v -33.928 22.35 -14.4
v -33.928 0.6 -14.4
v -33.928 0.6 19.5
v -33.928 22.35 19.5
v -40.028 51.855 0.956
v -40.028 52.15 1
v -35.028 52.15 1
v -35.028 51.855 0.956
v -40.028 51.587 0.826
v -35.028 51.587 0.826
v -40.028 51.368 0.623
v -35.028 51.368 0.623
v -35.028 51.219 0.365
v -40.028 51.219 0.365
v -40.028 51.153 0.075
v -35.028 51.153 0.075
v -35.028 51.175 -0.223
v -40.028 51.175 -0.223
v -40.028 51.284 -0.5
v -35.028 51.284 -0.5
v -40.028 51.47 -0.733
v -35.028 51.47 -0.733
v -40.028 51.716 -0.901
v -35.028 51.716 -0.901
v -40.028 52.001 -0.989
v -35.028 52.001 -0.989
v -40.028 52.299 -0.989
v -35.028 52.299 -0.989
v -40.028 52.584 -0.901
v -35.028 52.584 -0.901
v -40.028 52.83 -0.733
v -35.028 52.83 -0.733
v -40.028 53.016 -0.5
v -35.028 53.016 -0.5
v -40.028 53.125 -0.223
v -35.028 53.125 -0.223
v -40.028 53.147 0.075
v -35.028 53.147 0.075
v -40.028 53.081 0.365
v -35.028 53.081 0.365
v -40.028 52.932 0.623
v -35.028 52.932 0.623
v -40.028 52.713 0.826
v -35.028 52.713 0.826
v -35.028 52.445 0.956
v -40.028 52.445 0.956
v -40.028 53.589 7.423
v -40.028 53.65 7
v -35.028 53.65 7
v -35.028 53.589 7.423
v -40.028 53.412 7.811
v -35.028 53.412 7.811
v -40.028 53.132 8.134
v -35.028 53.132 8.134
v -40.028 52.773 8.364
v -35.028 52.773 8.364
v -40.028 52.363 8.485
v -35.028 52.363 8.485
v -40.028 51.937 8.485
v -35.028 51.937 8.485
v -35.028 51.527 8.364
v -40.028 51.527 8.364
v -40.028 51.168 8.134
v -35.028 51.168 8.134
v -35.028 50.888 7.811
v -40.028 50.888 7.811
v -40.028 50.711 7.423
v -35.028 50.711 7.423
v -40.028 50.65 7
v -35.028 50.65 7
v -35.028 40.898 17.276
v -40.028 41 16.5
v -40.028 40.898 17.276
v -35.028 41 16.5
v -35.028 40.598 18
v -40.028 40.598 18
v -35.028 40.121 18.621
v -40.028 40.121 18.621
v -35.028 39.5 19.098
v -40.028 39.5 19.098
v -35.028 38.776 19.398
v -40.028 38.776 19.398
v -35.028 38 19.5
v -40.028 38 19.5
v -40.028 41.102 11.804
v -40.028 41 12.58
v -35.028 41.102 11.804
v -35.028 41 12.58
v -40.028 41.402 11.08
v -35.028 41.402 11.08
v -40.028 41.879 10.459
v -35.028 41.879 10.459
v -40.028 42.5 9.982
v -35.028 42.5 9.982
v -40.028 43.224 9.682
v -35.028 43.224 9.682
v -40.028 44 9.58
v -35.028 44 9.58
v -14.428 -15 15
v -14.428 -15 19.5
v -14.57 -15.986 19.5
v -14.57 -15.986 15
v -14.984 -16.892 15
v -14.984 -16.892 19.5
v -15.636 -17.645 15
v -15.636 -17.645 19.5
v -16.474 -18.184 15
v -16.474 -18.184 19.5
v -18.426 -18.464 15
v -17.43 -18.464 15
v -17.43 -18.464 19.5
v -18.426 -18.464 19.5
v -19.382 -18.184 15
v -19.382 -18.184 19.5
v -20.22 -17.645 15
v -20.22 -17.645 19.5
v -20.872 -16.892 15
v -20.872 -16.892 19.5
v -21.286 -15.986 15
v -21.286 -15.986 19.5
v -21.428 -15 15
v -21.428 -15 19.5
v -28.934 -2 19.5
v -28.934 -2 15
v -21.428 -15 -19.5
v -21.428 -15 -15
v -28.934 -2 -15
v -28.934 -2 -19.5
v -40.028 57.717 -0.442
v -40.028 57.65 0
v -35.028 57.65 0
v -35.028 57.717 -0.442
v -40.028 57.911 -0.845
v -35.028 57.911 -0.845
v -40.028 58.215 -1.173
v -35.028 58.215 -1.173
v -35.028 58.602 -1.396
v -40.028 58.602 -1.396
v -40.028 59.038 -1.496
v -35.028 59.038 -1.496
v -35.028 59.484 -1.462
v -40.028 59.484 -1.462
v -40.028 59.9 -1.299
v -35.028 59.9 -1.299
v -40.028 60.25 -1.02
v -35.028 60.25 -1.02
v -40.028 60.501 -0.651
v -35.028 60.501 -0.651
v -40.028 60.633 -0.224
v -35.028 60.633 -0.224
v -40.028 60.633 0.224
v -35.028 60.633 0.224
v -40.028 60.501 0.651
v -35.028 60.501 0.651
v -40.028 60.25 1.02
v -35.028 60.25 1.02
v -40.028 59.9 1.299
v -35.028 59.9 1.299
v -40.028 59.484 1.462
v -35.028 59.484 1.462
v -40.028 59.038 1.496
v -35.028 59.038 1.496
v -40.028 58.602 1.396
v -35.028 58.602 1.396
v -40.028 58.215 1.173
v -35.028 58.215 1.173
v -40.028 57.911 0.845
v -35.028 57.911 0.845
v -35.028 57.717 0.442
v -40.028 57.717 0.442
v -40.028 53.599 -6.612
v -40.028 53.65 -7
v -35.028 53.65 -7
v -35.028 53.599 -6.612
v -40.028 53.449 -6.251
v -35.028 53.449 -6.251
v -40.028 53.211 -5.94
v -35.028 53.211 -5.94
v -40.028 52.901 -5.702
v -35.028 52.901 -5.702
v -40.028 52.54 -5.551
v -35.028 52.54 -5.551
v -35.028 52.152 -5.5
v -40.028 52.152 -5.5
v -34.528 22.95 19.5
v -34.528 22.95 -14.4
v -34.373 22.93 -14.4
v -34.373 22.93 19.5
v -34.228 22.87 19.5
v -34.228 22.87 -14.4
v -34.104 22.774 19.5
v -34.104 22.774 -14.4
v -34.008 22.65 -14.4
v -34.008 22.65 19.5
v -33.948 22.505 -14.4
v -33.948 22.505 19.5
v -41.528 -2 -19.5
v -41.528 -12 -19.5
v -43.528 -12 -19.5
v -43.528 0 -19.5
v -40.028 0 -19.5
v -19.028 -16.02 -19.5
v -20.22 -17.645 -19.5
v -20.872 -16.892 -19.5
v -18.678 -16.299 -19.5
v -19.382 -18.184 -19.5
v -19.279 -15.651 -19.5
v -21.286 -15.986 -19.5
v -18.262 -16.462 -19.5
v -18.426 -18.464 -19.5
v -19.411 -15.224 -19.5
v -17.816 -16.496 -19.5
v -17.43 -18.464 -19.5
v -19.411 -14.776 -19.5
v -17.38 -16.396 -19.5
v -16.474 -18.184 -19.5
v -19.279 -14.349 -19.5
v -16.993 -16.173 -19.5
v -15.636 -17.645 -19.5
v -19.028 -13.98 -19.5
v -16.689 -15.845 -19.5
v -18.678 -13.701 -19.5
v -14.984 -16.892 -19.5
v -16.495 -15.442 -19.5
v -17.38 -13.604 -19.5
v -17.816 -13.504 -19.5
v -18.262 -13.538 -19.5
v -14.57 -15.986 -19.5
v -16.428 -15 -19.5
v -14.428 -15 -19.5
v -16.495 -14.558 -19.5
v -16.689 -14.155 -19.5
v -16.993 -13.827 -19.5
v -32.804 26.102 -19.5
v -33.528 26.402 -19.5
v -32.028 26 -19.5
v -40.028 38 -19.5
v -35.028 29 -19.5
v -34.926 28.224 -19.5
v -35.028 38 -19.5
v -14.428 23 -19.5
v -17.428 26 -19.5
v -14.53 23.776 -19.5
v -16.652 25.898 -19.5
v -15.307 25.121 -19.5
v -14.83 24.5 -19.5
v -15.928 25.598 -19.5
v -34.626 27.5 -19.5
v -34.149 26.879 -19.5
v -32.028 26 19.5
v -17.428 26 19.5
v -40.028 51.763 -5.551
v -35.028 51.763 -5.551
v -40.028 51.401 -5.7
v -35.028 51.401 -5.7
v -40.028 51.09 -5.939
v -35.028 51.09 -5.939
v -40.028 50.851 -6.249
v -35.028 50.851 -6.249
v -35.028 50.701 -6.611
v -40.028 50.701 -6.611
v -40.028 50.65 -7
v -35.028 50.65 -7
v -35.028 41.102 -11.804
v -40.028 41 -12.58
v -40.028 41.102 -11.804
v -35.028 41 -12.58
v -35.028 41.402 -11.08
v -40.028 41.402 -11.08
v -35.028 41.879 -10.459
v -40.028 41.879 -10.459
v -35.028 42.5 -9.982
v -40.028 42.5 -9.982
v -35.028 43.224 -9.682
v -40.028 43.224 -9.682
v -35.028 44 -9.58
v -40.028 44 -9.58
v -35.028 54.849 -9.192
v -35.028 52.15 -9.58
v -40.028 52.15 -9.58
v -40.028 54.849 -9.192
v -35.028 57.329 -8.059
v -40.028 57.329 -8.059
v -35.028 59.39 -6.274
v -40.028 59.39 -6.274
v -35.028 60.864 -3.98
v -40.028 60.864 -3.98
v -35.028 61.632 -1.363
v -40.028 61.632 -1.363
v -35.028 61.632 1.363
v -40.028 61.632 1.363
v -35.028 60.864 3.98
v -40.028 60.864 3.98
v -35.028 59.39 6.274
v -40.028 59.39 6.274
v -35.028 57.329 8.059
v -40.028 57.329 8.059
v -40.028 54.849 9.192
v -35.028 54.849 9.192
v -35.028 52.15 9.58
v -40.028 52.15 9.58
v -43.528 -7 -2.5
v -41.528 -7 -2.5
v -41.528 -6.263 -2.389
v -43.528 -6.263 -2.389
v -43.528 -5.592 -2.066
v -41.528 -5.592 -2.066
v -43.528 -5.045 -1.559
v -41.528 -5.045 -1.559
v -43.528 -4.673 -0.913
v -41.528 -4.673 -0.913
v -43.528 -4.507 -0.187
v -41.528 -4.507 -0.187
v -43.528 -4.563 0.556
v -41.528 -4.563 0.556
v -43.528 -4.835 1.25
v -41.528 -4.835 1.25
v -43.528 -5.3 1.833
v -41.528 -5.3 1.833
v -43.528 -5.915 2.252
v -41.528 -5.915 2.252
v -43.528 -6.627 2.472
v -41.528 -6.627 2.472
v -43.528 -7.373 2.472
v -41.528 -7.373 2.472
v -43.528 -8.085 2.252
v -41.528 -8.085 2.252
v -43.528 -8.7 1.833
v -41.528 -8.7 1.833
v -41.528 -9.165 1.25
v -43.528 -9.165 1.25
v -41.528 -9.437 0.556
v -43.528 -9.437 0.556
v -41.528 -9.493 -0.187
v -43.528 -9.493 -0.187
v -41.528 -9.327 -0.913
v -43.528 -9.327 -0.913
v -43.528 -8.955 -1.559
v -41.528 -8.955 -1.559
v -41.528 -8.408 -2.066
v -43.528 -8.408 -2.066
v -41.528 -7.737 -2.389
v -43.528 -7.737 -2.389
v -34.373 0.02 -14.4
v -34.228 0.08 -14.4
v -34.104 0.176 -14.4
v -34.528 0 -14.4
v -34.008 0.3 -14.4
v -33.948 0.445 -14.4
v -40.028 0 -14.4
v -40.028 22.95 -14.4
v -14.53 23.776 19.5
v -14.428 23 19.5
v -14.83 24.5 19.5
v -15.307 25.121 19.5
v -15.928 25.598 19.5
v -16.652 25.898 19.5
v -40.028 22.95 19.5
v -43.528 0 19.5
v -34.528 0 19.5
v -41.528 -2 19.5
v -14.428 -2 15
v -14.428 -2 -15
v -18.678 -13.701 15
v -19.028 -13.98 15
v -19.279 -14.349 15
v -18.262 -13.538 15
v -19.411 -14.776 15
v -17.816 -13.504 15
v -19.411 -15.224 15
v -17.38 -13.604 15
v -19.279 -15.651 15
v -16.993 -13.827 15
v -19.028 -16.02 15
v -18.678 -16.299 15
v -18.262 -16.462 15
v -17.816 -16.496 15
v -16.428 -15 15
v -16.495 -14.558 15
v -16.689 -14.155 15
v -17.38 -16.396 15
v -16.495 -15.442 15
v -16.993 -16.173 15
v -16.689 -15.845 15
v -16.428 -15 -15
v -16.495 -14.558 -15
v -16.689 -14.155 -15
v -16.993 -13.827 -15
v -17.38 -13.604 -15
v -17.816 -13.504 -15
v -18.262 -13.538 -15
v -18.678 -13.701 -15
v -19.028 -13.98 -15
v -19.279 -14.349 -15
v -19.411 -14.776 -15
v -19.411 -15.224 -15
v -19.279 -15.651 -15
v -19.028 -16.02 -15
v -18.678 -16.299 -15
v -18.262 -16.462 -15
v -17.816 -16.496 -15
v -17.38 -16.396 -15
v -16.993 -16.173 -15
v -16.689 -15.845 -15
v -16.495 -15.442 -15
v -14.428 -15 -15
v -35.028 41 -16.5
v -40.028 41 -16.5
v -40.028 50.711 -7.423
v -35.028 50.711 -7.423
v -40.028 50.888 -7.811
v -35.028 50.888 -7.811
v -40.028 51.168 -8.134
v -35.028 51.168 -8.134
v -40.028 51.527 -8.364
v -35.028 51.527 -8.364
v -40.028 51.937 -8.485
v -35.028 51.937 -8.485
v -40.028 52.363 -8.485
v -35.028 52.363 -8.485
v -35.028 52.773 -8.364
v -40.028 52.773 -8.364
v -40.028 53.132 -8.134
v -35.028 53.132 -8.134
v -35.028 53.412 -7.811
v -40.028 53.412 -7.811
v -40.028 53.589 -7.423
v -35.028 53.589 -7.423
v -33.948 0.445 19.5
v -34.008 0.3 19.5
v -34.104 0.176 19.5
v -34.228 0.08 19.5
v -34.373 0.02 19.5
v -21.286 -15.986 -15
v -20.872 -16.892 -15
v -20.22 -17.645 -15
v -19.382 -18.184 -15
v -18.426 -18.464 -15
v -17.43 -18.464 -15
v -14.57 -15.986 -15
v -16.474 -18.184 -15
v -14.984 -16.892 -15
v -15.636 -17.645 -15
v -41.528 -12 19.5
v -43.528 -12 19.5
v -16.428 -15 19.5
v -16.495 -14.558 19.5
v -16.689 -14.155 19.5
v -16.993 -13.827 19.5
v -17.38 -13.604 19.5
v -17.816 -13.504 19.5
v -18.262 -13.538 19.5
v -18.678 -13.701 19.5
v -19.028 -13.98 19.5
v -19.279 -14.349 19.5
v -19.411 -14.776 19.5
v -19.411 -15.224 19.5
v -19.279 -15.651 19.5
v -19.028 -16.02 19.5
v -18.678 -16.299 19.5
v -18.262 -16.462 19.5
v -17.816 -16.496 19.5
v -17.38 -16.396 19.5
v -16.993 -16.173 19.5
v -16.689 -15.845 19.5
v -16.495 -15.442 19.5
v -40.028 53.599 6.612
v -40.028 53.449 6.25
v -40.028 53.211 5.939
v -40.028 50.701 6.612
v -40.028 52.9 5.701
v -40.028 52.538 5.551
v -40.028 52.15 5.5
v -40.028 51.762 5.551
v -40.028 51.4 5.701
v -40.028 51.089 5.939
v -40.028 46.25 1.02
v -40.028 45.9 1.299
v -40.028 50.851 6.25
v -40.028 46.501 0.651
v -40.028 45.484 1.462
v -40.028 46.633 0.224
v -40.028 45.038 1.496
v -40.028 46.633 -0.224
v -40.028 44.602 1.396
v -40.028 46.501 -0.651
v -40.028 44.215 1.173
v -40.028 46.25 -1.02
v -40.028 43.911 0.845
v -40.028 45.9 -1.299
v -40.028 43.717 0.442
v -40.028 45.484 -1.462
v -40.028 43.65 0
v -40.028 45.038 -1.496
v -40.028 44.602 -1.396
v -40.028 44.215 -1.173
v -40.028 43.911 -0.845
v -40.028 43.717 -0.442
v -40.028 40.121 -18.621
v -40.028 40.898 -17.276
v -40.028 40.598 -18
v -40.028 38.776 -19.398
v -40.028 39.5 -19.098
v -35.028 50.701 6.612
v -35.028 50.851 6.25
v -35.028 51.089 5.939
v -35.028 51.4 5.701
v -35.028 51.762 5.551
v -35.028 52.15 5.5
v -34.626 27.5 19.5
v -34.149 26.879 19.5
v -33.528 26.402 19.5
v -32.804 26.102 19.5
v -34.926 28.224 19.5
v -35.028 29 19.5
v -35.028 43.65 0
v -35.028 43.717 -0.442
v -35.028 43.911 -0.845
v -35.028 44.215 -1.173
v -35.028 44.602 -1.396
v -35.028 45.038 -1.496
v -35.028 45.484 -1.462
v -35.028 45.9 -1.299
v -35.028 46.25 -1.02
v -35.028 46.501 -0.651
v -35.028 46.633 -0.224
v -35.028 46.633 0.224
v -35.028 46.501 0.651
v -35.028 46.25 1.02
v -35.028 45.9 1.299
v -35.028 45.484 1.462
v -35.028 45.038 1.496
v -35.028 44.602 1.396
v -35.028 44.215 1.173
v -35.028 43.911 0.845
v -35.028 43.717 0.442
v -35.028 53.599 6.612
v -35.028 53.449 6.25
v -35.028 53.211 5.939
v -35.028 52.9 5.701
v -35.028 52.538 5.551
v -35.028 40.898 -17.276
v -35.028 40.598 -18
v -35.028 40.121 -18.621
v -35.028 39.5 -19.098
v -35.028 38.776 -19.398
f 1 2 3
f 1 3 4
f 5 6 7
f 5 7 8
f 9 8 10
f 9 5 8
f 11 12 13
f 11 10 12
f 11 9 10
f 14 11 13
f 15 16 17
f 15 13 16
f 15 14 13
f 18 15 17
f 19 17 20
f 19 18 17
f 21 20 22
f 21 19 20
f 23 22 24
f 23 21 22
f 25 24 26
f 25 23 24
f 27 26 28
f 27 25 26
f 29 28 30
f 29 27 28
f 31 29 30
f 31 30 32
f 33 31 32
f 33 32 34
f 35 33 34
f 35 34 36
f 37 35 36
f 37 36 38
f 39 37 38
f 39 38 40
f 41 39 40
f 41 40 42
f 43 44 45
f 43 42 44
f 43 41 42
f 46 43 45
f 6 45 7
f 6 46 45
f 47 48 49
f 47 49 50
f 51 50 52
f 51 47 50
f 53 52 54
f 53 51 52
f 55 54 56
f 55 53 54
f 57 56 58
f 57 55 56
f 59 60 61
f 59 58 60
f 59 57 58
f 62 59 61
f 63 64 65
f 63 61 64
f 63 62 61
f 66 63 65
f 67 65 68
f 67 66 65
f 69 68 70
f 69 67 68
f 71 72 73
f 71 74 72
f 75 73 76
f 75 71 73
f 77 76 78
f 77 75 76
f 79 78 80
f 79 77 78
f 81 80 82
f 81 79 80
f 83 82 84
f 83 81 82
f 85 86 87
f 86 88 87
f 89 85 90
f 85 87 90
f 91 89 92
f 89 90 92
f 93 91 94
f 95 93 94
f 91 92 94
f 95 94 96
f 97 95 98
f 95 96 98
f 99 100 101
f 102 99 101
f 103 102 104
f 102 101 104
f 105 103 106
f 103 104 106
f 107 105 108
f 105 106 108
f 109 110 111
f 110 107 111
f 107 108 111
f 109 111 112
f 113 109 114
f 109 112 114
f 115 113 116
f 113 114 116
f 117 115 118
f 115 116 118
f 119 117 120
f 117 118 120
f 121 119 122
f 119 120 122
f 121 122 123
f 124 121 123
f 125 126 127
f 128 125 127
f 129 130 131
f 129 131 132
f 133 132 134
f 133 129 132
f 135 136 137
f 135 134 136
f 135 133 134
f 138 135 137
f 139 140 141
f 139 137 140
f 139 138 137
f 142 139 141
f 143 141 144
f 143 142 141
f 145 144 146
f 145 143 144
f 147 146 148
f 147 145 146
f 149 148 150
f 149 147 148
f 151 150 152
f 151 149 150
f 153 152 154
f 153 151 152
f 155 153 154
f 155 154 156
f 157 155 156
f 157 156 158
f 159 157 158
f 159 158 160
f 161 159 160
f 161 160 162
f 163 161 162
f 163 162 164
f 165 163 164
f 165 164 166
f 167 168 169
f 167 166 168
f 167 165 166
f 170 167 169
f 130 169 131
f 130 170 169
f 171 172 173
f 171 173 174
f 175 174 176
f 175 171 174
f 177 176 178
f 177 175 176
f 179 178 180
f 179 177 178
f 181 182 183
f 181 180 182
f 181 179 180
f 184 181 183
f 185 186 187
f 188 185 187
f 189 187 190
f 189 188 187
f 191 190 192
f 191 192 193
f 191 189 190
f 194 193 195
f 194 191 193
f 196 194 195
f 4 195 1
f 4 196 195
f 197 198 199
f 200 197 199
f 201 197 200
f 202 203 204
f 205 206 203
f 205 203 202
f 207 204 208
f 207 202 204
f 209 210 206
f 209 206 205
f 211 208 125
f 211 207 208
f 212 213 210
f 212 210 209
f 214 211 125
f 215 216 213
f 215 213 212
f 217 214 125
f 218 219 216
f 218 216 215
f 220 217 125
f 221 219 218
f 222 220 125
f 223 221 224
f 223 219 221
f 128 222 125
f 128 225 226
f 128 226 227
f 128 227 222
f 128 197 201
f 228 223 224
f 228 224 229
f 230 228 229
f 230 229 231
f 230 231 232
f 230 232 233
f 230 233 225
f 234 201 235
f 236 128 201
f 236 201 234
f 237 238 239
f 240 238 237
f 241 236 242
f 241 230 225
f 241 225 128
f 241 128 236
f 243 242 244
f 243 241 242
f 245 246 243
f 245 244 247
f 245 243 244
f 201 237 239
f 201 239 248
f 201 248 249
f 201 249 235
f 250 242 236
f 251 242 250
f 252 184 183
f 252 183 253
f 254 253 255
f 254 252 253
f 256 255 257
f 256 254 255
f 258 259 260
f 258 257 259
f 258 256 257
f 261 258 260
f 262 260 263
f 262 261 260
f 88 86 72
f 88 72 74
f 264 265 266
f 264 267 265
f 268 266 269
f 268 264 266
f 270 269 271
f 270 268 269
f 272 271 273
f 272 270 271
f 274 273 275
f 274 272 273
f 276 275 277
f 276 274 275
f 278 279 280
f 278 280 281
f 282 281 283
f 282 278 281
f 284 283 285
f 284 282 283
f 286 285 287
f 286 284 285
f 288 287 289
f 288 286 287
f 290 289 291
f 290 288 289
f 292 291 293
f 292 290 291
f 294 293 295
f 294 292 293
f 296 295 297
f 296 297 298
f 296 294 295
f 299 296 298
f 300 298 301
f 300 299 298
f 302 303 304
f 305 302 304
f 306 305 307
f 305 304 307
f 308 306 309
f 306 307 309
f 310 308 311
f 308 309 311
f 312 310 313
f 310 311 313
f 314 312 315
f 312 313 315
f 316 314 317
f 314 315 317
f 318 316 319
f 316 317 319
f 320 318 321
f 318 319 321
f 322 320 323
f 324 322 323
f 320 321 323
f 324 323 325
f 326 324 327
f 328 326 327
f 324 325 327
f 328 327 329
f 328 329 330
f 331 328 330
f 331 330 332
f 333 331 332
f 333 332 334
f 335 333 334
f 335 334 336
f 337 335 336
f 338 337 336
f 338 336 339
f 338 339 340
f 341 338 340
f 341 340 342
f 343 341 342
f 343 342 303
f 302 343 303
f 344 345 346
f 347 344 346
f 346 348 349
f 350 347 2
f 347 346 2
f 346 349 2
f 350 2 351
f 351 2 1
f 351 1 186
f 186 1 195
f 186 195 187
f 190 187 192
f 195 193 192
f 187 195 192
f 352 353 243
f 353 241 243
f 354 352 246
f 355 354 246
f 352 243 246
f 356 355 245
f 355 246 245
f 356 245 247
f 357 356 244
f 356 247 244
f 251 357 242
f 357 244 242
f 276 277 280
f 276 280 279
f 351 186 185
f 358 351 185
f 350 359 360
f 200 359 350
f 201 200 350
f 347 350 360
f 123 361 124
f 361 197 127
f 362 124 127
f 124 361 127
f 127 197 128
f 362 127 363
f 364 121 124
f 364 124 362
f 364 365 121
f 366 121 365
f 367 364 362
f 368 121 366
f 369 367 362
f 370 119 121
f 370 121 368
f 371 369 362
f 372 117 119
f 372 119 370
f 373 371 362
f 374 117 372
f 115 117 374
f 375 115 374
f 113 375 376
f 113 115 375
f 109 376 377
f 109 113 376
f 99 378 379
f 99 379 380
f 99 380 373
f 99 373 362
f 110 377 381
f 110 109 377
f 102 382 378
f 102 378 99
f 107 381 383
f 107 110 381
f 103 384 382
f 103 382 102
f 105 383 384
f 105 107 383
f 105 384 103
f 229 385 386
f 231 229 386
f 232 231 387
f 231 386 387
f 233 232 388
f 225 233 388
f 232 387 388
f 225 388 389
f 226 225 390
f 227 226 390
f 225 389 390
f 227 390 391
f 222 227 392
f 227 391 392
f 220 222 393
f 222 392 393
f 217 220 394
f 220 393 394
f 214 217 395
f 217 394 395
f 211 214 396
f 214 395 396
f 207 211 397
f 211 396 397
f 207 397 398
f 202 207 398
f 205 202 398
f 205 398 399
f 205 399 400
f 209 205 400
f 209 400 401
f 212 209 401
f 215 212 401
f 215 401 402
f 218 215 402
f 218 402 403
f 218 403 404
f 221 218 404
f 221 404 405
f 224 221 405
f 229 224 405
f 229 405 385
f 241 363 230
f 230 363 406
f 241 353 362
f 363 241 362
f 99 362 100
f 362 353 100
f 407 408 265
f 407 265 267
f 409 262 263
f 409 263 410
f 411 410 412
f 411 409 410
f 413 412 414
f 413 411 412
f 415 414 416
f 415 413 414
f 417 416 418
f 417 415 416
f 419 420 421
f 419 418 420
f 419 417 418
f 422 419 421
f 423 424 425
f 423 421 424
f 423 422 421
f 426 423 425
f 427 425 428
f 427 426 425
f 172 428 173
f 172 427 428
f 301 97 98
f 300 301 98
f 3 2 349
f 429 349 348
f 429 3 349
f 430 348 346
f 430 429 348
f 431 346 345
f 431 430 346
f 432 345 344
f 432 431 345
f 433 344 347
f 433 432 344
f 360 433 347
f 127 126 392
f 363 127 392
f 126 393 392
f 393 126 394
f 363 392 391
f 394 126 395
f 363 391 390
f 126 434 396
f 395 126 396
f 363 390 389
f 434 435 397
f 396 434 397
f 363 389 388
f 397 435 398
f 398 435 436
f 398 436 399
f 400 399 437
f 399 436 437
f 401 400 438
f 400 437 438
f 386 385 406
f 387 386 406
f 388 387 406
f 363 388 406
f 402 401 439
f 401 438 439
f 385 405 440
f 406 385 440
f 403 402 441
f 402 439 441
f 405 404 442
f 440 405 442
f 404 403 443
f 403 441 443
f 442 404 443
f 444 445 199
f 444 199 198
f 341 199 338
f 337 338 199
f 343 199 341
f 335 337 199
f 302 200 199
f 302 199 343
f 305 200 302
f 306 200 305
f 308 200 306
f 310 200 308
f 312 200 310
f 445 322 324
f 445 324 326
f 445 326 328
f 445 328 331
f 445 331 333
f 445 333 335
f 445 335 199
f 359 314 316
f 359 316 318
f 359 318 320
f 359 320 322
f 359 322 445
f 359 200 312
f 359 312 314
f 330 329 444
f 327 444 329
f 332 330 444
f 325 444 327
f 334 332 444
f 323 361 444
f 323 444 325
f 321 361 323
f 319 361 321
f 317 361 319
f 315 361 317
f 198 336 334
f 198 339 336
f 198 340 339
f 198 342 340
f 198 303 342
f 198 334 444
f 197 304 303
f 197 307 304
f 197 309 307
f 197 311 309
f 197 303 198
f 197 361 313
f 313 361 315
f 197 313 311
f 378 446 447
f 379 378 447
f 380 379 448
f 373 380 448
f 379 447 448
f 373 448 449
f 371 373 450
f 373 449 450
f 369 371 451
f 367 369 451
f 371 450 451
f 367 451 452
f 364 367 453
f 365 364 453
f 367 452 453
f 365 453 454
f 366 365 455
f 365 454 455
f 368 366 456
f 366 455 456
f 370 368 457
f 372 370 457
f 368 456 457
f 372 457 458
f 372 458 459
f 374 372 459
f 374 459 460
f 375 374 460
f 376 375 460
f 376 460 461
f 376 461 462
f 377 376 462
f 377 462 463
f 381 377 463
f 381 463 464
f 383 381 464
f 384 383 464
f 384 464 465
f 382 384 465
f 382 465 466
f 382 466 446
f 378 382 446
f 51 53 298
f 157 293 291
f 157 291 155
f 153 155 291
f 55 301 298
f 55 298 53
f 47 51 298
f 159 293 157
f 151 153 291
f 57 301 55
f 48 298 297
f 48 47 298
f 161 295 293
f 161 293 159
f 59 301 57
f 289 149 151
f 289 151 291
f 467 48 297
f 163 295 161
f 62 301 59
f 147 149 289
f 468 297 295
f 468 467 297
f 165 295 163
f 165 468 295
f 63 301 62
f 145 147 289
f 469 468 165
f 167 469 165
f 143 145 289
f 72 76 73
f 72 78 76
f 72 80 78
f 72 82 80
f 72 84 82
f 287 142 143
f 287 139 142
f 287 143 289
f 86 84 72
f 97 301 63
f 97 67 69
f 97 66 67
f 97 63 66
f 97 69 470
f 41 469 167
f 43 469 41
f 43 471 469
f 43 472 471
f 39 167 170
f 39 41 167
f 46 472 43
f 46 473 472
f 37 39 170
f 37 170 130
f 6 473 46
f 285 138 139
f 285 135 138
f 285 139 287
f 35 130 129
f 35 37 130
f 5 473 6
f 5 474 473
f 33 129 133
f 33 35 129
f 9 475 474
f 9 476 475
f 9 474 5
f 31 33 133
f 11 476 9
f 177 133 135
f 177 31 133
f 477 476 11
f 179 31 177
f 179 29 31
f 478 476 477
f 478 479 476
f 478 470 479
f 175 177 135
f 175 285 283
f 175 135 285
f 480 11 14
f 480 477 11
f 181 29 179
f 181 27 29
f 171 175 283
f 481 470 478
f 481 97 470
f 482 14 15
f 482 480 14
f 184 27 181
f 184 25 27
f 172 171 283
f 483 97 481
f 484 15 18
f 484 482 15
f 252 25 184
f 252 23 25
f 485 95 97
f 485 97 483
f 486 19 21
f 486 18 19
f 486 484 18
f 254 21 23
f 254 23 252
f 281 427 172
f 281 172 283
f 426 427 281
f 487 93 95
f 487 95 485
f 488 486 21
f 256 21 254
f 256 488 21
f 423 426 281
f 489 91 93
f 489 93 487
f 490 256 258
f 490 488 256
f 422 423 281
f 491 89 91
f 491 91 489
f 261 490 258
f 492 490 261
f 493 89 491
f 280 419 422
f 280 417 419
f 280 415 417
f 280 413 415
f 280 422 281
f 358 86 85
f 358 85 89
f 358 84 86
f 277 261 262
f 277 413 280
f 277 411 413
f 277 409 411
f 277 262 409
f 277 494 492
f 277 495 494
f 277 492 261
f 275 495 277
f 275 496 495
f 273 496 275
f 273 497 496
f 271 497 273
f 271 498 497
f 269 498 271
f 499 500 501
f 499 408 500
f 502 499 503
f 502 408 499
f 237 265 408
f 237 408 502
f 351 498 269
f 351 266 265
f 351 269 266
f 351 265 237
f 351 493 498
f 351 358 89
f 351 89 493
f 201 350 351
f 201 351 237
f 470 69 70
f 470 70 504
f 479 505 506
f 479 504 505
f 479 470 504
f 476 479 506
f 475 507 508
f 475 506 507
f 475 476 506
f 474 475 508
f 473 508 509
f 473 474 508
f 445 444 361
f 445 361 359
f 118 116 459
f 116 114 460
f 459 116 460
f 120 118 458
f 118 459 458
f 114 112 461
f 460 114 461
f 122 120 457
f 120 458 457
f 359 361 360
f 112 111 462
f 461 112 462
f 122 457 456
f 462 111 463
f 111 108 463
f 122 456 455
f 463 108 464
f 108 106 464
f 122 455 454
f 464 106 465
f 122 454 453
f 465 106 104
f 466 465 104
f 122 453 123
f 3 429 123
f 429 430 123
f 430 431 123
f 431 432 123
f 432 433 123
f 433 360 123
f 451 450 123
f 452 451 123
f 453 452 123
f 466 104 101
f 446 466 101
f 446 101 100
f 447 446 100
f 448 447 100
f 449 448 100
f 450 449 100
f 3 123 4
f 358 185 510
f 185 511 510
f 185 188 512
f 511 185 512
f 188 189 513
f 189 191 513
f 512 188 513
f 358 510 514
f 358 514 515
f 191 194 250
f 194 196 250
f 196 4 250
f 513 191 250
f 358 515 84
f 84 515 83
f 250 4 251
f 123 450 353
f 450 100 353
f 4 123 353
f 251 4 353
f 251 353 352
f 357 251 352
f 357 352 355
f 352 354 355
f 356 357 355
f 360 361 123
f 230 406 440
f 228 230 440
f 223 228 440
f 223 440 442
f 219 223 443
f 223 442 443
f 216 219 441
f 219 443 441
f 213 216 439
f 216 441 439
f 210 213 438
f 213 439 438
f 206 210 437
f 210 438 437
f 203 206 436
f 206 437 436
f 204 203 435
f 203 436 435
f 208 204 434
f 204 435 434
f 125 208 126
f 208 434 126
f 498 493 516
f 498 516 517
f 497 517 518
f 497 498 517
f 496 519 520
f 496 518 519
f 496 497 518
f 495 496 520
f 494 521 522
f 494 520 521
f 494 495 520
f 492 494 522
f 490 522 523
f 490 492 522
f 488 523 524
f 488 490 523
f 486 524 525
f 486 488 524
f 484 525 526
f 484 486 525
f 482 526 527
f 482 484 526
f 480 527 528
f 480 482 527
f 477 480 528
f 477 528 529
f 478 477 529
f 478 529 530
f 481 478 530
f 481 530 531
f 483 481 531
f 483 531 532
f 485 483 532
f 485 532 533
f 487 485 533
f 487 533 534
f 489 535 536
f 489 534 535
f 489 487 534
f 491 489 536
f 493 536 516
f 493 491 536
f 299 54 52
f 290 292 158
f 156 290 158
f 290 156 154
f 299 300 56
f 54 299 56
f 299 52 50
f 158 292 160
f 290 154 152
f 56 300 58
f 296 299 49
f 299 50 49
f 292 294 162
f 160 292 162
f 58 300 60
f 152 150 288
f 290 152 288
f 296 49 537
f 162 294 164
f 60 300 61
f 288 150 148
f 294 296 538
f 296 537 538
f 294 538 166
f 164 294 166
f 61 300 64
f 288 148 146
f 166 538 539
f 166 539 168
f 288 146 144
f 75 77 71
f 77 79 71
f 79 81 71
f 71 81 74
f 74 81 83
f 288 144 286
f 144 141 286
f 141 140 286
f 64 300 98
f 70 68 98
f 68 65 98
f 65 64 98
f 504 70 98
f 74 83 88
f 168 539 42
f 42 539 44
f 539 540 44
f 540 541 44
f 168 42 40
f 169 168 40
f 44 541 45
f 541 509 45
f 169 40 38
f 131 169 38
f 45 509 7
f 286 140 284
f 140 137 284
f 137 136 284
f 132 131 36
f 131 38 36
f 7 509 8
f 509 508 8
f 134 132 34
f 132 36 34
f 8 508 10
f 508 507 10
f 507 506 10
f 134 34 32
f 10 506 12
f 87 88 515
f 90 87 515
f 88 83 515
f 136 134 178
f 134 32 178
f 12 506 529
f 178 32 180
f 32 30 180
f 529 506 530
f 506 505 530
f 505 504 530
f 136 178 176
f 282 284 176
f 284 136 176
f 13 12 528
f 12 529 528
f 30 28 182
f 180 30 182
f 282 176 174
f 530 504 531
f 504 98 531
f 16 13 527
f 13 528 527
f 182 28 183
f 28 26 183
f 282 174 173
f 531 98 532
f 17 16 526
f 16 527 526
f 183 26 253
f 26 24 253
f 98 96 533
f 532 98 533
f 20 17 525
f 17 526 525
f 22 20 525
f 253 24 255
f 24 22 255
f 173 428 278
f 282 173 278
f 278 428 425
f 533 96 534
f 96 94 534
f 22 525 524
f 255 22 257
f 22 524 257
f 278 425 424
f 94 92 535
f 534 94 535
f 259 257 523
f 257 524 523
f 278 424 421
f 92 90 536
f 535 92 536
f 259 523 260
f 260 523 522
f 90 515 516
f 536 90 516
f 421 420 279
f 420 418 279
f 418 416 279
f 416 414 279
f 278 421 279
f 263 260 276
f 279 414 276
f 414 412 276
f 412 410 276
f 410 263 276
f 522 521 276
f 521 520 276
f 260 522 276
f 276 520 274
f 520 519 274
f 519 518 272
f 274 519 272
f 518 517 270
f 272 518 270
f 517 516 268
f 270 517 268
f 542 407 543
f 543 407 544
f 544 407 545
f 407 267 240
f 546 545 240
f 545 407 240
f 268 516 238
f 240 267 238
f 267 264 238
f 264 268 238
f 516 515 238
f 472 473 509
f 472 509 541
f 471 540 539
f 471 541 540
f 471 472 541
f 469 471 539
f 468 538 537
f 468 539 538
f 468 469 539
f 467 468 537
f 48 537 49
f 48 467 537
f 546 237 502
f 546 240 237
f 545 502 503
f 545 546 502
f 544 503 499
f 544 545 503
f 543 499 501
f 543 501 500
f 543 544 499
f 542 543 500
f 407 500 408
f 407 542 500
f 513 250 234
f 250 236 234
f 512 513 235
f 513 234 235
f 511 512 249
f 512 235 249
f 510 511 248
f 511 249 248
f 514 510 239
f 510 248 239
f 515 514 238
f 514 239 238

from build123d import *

# Parameters (mm, degrees)
BOSS_EXTRUDE1_DEPTH      = 19.5
SKETCH3_W                = 2
SKETCH3_H                = 39
BOSS_EXTRUDE2_DEPTH      = 10
SKETCH4_R                = 2.5
CUT_EXTRUDE3_DEPTH       = 10
SKETCH5_W                = 5.1
SKETCH5_H                = 22.95
BOSS_EXTRUDE3_DEPTH      = 25.1
SKETCH8_W                = 15.5
SKETCH8_H                = 22.95
BOSS_EXTRUDE4_DEPTH      = 33.9
BOSS_EXTRUDE5_DEPTH      = 19.5
SKETCH12_W               = 30.263636296
SKETCH12_H               = 30
CUT_EXTRUDE6_DEPTH       = 16.5
SKETCH13_R               = 1.5
CUT_EXTRUDE7_DEPTH       = 64.966273157
FILLET3_R                = 3
SKETCH16_W               = 39
SKETCH16_H               = 3.05
BOSS_EXTRUDE6_DEPTH      = 25.1
SKETCH17_W               = 5
SKETCH17_H               = 39
BOSS_EXTRUDE7_DEPTH      = 15
FILLET4_R                = 3
FILLET11_R               = 0.6
FILLET12_R               = 0.6
SKETCH18_W               = 5
SKETCH18_H               = 19.16
BOSS_EXTRUDE12_DEPTH     = 25.725
CUT_EXTRUDE13_DEPTH      = 73.504038681
CUT_EXTRUDE13_DEPTH_BACK = 73.504038681
CUT_EXTRUDE14_DEPTH      = 73.504038681
FILLET15_R               = 3
FILLET16_R               = 3
FILLET17_R               = 3
FILLET18_R               = 3
SKETCH23_W               = 3.5
SKETCH23_H               = 39
CUT_EXTRUDE15_DEPTH      = 26


with BuildPart() as part:
    # Sketch1 → Boss-Extrude1 (new, symmetric)
    with BuildSketch(Plane.XY):
        Polygon((-18.427969187, 26), (-18.427969187, 0), (-43.527969187, 0), (-43.527969187, -2), (-14.427969187, -2), (-14.427969187, 26), align=None)
    extrude(amount=BOSS_EXTRUDE1_DEPTH, both=True)

    # Sketch3 → Boss-Extrude2 (add)
    with BuildSketch(Plane(origin=(0, -2, 0), x_dir=(1, 0, 0), z_dir=(0, 1, 0))):
        with Locations((-42.527969187, 0)):
            Rectangle(SKETCH3_W, SKETCH3_H)
    extrude(amount=-BOSS_EXTRUDE2_DEPTH)

    # Sketch4 → Cut-Extrude3 (cut)
    with BuildSketch(Plane(origin=(-41.527969187, 0, 0), x_dir=(0, 0, -1), z_dir=(1, 0, 0))):
        with Locations((0, -7)):
            Circle(SKETCH4_R)
    extrude(amount=-CUT_EXTRUDE3_DEPTH, mode=Mode.SUBTRACT)

    # Sketch5 → Boss-Extrude3 (add)
    with BuildSketch(Plane.ZY.offset(18.427969187)):
        with Locations((-16.95, 11.475)):
            Rectangle(SKETCH5_W, SKETCH5_H)
    extrude(amount=BOSS_EXTRUDE3_DEPTH)

    # Sketch8 → Boss-Extrude4 (add)
    with BuildSketch(Plane.XY.offset(-14.4)):
        with Locations((-26.177969187, 11.475)):
            Rectangle(SKETCH8_W, SKETCH8_H)
    extrude(amount=BOSS_EXTRUDE4_DEPTH)

    # Sketch11 → Boss-Extrude5 (add, symmetric)
    with BuildSketch(Plane.XY):
        with BuildLine():
            Line((-14.427969187, -2), (-14.427969187, -15))
            ThreePointArc((-14.427969187, -15), (-17.927969187, -18.5), (-21.427969187, -15))
            Line((-21.427969187, -15), (-28.933522687, -2))
            Line((-28.933522687, -2), (-14.427969187, -2))
        make_face()
    extrude(amount=BOSS_EXTRUDE5_DEPTH, both=True)

    # Sketch12 → Cut-Extrude6 (cut)
    with BuildSketch(Plane(origin=(0, -18.5, 0), x_dir=(1, 0, 0), z_dir=(0, 1, 0))):
        with Locations((-18.965310336, 0)):
            Rectangle(SKETCH12_W, SKETCH12_H)
    extrude(amount=CUT_EXTRUDE6_DEPTH, mode=Mode.SUBTRACT)

    # Sketch13 → Cut-Extrude7 (cut, through all)
    with BuildSketch(Plane.XY.offset(19.5)):
        with Locations((-17.927969187, -15)):
            Circle(SKETCH13_R)
    extrude(amount=-CUT_EXTRUDE7_DEPTH, mode=Mode.SUBTRACT)

    # Fillet3
    fillet3_edges = [part.edges().sort_by_distance(p)[0] for p in [
        (-14.427969187, 26, 0),
    ]]
    fillet(fillet3_edges, radius=FILLET3_R)

    # Sketch16 → Boss-Extrude6 (add)
    with BuildSketch(Plane.ZY.offset(18.427969187)):
        with Locations((0, 24.475)):
            Rectangle(SKETCH16_W, SKETCH16_H)
    extrude(amount=BOSS_EXTRUDE6_DEPTH)

    # Sketch17 → Boss-Extrude7 (add)
    with BuildSketch(Plane(origin=(0, 26, 0), x_dir=(1, 0, 0), z_dir=(0, 1, 0))):
        with Locations((-37.527969187, 0)):
            Rectangle(SKETCH17_W, SKETCH17_H)
    extrude(amount=BOSS_EXTRUDE7_DEPTH)

    # Fillet4
    fillet4_edges = [part.edges().sort_by_distance(p)[0] for p in [
        (-35.027969187, 26, 0),
    ]]
    fillet(fillet4_edges, radius=FILLET4_R)

    # Fillet11
    fillet11_edges = [part.edges().sort_by_distance(p)[0] for p in [
        (-33.927969187, 22.95, 2.55),
    ]]
    fillet(fillet11_edges, radius=FILLET11_R)

    # Fillet12
    fillet12_edges = [part.edges().sort_by_distance(p)[0] for p in [
        (-33.927969187, 0, 2.55),
    ]]
    fillet(fillet12_edges, radius=FILLET12_R)

    # Sketch18 → Boss-Extrude12 (add)
    with BuildSketch(Plane(origin=(0, 41, 0), x_dir=(1, 0, 0), z_dir=(0, 1, 0))):
        with Locations((-37.527969187, 0)):
            Rectangle(SKETCH18_W, SKETCH18_H)
    extrude(amount=BOSS_EXTRUDE12_DEPTH)

    # Sketch20 → Cut-Extrude13 (cut, two sides: drawn at the far end of the back side and taken through both)
    with BuildSketch(Plane(origin=(-35.027969187, 0, 0), x_dir=(0, 0, -1), z_dir=(1, 0, 0)).offset(-CUT_EXTRUDE13_DEPTH_BACK)):
        with BuildLine():
            ThreePointArc((0, 46.65), (-1.5, 45.15), (0, 43.65))
            ThreePointArc((0, 43.65), (1.5, 45.15), (0, 46.65))
        make_face()
        with BuildLine():
            ThreePointArc((-7, 53.65), (-8.5, 52.15), (-7, 50.65))
            ThreePointArc((-7, 50.65), (-5.939339828, 51.089339828), (-5.5, 52.15))
            ThreePointArc((-5.5, 52.15), (-5.939339828, 53.210660172), (-7, 53.65))
        make_face()
        with BuildLine():
            ThreePointArc((0, 60.65), (-1.5, 59.15), (0, 57.65))
            ThreePointArc((0, 57.65), (1.5, 59.15), (0, 60.65))
        make_face()
        with BuildLine():
            ThreePointArc((7, 53.65), (5.939959741, 53.211279722), (5.500001024, 52.151752864))
            ThreePointArc((5.500001024, 52.151752864), (5.938720278, 51.089959741), (7, 50.65))
            ThreePointArc((7, 50.65), (8.5, 52.15), (7, 53.65))
        make_face()
        with BuildLine():
            ThreePointArc((1, 52.15), (0, 53.15), (-1, 52.15))
            ThreePointArc((-1, 52.15), (0, 51.15), (1, 52.15))
        make_face()
    extrude(amount=CUT_EXTRUDE13_DEPTH + CUT_EXTRUDE13_DEPTH_BACK, mode=Mode.SUBTRACT)

    # Sketch21 → Cut-Extrude14 (cut, through all)
    with BuildSketch(Plane(origin=(-35.027969187, 0, 0), x_dir=(0, 0, -1), z_dir=(1, 0, 0))):
        with BuildLine():
            Line((-9.58, 66.725), (9.58, 66.725))
            Line((9.58, 66.725), (9.58, 52.15))
            ThreePointArc((9.58, 52.15), (0, 61.73), (-9.58, 52.15))
            Line((-9.58, 52.15), (-9.58, 66.725))
        make_face()
    extrude(amount=-CUT_EXTRUDE14_DEPTH, mode=Mode.SUBTRACT)

    # Fillet15
    fillet15_edges = [part.edges().sort_by_distance(p)[0] for p in [
        (-37.527969187, 41, 9.58),
    ]]
    fillet(fillet15_edges, radius=FILLET15_R)

    # Fillet16
    fillet16_edges = [part.edges().sort_by_distance(p)[0] for p in [
        (-37.527969187, 41, 19.5),
    ]]
    fillet(fillet16_edges, radius=FILLET16_R)

    # Fillet17
    fillet17_edges = [part.edges().sort_by_distance(p)[0] for p in [
        (-37.527969187, 41, -19.5),
    ]]
    fillet(fillet17_edges, radius=FILLET17_R)

    # Fillet18
    fillet18_edges = [part.edges().sort_by_distance(p)[0] for p in [
        (-37.527969187, 41, -9.58),
    ]]
    fillet(fillet18_edges, radius=FILLET18_R)

    # Sketch23 → Cut-Extrude15 (cut)
    with BuildSketch(Plane(origin=(0, 26, 0), x_dir=(1, 0, 0), z_dir=(0, 1, 0))):
        with Locations((-41.777969187, 0)):
            Rectangle(SKETCH23_W, SKETCH23_H)
    extrude(amount=-CUT_EXTRUDE15_DEPTH, mode=Mode.SUBTRACT)


solid = part.part
